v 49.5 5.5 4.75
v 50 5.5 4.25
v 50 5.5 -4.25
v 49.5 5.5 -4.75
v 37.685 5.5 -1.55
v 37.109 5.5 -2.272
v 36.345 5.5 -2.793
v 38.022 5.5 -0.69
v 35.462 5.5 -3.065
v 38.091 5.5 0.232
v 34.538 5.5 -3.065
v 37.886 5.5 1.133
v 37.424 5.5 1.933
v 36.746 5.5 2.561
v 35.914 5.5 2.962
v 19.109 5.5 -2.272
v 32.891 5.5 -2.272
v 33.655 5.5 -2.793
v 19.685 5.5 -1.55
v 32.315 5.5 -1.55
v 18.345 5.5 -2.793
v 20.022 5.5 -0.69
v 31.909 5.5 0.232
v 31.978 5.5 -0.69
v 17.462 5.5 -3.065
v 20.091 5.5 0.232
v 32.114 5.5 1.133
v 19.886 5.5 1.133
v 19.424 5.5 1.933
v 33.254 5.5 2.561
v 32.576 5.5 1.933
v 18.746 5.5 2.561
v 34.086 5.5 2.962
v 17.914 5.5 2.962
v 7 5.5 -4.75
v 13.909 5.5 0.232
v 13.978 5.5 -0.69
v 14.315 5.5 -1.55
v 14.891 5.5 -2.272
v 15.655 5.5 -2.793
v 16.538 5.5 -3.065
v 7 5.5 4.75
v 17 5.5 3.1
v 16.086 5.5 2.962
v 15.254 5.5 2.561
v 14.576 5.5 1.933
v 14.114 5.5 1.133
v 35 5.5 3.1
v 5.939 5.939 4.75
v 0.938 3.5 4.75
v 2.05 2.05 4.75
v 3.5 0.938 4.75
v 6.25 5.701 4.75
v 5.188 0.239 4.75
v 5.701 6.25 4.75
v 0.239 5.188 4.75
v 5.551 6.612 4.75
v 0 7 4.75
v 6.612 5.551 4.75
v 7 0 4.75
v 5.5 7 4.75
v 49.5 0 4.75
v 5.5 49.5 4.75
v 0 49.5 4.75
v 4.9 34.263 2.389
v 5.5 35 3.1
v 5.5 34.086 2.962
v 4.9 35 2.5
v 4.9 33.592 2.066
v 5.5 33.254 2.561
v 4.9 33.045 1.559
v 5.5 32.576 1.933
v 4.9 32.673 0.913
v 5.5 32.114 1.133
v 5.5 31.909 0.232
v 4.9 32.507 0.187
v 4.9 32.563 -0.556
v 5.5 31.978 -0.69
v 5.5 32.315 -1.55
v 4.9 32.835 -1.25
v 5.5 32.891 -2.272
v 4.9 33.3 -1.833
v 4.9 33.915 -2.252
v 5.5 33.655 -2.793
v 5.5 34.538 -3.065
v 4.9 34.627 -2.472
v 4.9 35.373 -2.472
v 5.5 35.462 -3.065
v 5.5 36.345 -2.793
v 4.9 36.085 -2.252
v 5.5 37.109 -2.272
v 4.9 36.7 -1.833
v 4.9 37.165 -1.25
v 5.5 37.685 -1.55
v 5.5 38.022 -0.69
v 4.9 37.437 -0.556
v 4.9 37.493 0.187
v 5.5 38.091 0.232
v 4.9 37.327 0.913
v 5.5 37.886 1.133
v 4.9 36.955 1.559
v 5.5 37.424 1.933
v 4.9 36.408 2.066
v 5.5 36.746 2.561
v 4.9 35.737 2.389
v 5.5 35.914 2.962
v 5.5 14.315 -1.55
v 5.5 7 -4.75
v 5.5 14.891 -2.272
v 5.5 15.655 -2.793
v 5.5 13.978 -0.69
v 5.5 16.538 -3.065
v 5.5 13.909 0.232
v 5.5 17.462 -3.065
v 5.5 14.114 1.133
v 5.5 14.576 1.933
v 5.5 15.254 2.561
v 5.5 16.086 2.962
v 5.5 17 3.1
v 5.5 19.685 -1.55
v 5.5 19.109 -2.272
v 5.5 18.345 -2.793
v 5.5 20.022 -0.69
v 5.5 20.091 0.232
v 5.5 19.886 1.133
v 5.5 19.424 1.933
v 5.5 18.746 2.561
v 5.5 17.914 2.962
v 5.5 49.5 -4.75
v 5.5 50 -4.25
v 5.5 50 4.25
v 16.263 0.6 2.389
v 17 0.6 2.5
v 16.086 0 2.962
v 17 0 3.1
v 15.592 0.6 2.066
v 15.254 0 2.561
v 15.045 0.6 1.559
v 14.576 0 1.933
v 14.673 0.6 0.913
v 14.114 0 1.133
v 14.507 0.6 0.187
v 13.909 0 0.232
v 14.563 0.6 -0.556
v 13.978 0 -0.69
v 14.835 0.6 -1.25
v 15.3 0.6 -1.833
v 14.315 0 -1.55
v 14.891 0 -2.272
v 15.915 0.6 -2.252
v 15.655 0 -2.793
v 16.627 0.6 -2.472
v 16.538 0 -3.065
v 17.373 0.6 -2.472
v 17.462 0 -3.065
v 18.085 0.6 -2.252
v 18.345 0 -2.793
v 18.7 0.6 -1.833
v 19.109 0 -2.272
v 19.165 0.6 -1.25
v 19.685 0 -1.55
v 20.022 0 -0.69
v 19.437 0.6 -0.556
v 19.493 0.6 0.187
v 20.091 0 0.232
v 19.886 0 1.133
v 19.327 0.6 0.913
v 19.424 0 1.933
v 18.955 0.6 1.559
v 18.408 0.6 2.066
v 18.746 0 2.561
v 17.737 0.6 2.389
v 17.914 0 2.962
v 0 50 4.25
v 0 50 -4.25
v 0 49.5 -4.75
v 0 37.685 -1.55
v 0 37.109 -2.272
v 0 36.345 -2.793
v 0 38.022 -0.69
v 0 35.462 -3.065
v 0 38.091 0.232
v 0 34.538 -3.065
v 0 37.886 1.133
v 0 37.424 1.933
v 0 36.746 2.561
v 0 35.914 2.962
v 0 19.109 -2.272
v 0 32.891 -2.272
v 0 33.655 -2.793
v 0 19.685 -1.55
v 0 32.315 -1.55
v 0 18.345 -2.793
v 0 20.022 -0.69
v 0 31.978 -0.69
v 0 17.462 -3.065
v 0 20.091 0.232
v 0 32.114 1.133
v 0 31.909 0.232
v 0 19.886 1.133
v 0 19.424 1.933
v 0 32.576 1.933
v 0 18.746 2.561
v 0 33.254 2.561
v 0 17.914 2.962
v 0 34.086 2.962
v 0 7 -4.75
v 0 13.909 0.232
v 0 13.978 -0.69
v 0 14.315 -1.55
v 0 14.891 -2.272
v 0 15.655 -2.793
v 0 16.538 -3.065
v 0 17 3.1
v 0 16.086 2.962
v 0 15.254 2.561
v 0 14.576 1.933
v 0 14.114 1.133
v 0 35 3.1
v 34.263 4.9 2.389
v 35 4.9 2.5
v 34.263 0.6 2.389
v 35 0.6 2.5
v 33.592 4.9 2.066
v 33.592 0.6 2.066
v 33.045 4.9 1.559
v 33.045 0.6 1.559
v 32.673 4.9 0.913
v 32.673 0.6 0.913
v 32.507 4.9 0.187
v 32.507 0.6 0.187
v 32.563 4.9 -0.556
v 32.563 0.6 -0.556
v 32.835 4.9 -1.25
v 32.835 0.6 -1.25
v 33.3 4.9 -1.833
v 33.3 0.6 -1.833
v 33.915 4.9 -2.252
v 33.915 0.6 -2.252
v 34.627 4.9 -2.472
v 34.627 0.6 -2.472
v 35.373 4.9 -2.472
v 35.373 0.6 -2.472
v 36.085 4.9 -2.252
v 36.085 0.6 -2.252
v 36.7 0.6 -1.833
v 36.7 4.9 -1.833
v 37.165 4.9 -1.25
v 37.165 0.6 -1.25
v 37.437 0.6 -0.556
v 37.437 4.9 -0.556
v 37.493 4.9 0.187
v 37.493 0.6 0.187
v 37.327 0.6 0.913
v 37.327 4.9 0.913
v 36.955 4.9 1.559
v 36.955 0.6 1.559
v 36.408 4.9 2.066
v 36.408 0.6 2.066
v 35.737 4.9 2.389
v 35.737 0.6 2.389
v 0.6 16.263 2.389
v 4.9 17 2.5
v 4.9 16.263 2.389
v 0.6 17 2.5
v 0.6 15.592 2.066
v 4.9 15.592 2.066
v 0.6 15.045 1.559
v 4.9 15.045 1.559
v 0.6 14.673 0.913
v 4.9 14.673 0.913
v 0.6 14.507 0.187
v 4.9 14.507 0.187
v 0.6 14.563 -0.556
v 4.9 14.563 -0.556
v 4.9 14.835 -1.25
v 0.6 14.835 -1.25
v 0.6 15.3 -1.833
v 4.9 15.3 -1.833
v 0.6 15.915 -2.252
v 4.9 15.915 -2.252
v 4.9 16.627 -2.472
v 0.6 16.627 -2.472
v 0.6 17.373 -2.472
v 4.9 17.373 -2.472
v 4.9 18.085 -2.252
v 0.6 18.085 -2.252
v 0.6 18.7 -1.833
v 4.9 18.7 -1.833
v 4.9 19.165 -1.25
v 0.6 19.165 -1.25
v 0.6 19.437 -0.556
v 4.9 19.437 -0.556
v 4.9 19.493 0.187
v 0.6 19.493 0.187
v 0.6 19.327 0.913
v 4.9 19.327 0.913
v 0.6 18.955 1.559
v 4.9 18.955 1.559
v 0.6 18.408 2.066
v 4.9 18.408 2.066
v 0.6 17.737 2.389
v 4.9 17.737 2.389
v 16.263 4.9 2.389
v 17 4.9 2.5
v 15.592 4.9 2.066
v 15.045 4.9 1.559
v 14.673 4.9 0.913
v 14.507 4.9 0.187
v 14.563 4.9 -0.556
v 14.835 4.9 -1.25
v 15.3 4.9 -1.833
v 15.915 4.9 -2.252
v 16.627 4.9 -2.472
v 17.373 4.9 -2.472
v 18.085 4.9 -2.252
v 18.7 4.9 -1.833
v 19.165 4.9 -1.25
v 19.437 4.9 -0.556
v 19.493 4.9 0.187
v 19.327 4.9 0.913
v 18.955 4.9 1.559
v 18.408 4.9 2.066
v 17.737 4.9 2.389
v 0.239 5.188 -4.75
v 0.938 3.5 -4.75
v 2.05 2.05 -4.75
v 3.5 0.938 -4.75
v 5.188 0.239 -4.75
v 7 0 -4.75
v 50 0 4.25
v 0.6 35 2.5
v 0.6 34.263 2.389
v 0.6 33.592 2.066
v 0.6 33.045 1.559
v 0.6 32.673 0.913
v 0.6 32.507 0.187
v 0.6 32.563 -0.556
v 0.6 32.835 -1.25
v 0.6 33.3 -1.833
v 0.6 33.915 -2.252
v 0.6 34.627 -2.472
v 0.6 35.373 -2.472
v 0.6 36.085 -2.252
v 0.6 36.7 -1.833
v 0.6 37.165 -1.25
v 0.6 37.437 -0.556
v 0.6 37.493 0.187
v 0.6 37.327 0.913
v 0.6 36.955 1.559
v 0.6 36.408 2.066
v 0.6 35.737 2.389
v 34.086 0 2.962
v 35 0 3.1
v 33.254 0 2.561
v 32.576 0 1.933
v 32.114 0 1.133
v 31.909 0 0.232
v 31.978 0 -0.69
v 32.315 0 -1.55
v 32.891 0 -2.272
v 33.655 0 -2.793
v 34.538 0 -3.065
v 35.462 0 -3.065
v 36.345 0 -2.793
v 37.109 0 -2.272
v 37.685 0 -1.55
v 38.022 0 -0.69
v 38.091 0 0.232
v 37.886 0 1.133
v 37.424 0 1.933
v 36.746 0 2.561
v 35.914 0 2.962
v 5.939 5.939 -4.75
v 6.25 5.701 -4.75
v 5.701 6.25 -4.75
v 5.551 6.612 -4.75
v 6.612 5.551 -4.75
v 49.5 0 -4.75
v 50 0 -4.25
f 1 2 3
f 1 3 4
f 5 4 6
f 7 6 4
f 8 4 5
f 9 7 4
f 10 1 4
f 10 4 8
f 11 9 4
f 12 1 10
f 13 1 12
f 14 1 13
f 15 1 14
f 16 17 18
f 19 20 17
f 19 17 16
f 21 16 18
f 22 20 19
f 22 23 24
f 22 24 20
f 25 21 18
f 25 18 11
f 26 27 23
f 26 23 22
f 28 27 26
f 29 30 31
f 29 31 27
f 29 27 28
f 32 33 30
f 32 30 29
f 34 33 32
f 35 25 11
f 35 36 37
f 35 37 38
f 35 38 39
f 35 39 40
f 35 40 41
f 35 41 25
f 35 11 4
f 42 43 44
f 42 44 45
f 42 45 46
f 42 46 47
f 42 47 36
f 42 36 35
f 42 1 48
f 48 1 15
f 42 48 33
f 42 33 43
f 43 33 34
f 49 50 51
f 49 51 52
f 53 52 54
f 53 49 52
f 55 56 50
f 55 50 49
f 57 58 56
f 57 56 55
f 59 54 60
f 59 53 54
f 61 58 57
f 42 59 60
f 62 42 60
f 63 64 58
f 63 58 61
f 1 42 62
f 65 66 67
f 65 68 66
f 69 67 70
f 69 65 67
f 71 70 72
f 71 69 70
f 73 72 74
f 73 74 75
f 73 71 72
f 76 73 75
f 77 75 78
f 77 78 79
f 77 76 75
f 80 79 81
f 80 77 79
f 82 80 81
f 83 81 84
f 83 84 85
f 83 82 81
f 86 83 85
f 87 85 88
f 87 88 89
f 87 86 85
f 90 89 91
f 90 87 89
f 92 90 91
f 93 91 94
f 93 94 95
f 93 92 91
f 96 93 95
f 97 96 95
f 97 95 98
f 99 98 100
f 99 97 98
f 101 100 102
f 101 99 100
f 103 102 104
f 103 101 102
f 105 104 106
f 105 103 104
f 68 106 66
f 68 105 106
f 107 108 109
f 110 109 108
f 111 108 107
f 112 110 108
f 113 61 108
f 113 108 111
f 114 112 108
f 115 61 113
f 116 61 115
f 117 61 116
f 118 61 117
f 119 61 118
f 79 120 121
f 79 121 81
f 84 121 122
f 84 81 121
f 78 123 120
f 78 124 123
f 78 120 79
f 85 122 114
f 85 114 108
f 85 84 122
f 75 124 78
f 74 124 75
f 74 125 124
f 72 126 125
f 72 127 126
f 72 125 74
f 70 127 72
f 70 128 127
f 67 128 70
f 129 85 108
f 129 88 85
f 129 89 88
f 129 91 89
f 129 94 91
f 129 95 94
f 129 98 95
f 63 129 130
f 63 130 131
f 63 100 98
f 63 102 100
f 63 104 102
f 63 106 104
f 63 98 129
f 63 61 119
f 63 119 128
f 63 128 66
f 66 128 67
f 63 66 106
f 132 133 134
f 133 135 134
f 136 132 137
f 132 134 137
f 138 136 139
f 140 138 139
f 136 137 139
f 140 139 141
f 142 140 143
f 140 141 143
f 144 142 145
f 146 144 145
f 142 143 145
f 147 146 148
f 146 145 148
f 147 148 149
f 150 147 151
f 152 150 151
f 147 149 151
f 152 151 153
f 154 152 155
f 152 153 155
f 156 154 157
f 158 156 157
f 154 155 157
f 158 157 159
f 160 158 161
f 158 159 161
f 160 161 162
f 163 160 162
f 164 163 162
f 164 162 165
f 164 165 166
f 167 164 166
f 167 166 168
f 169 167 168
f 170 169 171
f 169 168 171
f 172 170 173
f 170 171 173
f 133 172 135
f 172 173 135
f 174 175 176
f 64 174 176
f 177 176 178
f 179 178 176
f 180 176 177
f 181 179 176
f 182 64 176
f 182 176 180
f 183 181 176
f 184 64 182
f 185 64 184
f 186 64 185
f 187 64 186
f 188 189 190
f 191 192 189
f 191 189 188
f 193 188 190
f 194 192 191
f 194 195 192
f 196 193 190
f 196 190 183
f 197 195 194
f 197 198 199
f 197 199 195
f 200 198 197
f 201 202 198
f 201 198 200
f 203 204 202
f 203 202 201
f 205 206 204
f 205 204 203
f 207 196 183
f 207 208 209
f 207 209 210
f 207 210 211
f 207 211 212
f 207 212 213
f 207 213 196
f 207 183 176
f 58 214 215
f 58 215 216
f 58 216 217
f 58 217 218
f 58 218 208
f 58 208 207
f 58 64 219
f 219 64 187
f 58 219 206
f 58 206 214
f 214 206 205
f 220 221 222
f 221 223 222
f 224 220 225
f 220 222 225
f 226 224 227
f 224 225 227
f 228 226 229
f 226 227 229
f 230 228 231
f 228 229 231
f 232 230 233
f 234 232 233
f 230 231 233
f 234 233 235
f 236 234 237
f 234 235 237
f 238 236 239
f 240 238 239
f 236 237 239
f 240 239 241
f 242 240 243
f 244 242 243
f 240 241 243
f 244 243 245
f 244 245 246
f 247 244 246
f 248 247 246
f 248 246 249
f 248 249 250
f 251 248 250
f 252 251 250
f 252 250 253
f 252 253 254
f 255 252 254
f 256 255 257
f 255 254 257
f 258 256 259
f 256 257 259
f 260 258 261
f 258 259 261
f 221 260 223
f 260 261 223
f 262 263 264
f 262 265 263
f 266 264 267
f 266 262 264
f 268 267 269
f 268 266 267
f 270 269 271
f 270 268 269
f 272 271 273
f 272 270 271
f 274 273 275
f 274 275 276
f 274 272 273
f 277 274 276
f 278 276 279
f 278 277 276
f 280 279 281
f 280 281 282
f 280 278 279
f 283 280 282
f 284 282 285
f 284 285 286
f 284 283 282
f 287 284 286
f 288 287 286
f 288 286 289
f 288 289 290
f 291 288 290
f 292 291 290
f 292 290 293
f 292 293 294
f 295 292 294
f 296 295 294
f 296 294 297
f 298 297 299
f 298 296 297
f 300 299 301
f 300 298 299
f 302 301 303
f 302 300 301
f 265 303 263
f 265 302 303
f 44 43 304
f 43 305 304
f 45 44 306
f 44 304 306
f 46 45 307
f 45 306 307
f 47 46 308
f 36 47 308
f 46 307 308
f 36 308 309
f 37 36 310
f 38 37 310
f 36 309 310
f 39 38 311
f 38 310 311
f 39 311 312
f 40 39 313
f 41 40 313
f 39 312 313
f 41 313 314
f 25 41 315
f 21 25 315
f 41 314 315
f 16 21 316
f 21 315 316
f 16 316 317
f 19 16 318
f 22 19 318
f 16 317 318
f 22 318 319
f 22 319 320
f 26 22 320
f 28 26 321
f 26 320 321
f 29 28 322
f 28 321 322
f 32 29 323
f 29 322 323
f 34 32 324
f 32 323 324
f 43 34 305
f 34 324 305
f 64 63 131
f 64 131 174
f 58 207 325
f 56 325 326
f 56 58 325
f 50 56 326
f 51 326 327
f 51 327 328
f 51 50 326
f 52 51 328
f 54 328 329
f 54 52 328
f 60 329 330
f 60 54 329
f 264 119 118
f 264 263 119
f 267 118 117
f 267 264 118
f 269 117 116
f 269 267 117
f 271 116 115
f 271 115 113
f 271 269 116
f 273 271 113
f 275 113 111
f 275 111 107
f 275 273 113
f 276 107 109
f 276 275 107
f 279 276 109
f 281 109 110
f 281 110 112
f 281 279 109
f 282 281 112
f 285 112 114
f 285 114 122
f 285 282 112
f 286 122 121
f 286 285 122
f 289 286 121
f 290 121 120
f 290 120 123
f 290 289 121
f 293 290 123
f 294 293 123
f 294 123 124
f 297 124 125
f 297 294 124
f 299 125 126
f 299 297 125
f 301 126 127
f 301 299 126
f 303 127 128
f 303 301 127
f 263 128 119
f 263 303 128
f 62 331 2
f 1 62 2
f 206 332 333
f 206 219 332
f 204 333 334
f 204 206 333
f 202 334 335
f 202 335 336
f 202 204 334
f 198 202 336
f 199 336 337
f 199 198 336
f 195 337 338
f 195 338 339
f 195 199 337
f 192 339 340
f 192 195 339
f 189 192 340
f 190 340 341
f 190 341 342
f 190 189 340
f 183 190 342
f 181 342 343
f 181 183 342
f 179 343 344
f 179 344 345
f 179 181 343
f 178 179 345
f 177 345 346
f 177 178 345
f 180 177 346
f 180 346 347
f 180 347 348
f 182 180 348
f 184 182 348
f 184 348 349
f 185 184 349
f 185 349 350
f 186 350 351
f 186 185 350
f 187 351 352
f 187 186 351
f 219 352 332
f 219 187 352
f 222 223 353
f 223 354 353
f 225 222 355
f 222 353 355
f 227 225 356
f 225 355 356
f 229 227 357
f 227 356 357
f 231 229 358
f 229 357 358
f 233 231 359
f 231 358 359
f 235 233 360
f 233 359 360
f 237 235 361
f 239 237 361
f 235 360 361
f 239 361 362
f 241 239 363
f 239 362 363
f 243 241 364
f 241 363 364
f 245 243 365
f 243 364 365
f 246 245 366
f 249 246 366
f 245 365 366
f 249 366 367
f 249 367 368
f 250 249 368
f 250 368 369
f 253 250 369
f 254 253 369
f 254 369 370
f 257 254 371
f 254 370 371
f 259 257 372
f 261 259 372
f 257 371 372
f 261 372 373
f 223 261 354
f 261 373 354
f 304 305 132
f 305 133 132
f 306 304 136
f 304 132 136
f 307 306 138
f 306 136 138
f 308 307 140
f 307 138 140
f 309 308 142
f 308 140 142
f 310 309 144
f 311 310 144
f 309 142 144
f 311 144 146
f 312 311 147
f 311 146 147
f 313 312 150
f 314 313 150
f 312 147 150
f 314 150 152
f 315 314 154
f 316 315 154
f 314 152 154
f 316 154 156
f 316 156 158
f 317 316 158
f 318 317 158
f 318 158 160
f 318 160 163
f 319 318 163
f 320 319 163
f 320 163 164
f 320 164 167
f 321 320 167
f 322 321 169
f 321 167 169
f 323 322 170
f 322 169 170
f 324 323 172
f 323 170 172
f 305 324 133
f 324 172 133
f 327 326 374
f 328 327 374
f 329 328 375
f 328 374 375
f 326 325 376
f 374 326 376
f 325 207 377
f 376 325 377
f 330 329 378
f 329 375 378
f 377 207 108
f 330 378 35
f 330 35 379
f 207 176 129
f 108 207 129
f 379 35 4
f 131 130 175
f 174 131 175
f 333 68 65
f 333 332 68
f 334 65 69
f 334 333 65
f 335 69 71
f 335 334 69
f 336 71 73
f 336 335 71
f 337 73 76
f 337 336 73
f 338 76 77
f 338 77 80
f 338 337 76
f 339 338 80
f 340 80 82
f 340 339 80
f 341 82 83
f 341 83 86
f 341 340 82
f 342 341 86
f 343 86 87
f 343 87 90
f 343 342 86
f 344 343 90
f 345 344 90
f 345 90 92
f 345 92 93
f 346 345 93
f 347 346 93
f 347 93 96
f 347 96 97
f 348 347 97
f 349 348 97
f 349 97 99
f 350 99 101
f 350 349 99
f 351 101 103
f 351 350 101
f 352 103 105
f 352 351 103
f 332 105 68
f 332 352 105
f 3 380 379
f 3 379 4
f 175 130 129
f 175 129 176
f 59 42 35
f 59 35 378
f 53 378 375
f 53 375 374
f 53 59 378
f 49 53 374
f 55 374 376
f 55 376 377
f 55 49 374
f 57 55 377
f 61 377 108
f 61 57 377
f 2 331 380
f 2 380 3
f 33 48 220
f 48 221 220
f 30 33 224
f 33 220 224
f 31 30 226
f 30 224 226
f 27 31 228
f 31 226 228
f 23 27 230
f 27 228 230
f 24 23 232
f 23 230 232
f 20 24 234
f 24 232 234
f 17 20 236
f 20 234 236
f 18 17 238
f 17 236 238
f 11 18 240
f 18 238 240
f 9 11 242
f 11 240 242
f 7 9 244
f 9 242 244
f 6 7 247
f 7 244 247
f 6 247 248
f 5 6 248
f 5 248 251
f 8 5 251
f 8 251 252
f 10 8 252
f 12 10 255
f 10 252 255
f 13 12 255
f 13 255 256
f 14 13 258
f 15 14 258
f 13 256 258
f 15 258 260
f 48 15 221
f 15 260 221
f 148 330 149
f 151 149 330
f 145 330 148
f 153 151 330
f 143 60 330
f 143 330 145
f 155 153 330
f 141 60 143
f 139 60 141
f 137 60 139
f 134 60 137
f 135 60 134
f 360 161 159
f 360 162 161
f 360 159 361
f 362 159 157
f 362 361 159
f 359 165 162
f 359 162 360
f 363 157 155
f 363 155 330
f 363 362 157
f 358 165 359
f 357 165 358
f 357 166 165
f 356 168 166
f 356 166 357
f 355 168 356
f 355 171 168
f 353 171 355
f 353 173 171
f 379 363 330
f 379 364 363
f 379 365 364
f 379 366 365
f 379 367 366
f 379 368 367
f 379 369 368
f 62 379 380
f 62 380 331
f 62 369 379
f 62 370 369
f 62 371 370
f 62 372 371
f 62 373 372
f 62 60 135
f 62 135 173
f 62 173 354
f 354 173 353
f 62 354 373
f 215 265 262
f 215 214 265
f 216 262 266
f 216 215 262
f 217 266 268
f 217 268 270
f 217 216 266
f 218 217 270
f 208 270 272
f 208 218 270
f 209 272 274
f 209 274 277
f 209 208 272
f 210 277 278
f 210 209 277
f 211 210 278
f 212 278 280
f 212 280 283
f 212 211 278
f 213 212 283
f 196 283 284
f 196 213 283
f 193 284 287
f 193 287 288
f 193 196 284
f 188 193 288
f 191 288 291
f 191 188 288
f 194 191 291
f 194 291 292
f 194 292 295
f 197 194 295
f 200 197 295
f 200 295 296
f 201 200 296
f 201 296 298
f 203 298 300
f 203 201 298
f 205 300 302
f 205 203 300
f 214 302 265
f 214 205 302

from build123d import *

# Parameters (mm, degrees)
EXTRUDE_1_DEPTH            = 4.75
HOLE_WIZARD_M61_AT_2_COUNT = 2
HOLE_WIZARD_M61_AT_2_PITCH = 18
CHAMFER_1_SIZE             = 0.5


with BuildPart() as part:
    # Эскиз1 → Бобышка-Вытянуть1 (new body, symmetric)
    with BuildSketch(Plane.XY):
        with BuildLine():
            Line((0, 50), (0, 7))
            ThreePointArc((0, 7), (2.050252532, 2.050252532), (7, 0))
            Line((7, 0), (50, 0))
            Line((50, 0), (50, 5.5))
            Line((50, 5.5), (7, 5.5))
            ThreePointArc((7, 5.5), (5.939339828, 5.939339828), (5.5, 7))
            Line((5.5, 7), (5.5, 50))
            Line((5.5, 50), (0, 50))
        make_face()
    extrude(amount=EXTRUDE_1_DEPTH, both=True)

    # Эскиз5 → Отверстие обработанное метчиком M61 (revolve, cut)
    with BuildSketch(Plane.ZX.offset(35)):
        Polygon((0, 0), (0, 5.5), (3.1, 5.5), (2.5, 4.9), (2.5, 0.6), (3.1, 0), align=None)
    hole_wizard_m61 = revolve(axis=Axis((-6.35, 35, 0), (1, 0, 0)), mode=Mode.SUBTRACT)

    # Отверстие обработанное метчиком M61 at 2: Отверстие обработанное метчиком M61 ×2
    with Locations(*[(0, -i * HOLE_WIZARD_M61_AT_2_PITCH, 0) for i in range(1, HOLE_WIZARD_M61_AT_2_COUNT)]):
        add(hole_wizard_m61, mode=Mode.SUBTRACT)

    # Зеркальное отражение1: Отверстие обработанное метчиком M61 across plane
    add(hole_wizard_m61.mirror(Plane(origin=(0, 0, 0), x_dir=(0, 0, 1), z_dir=(-0.707106781, 0.707106781, 0))), mode=Mode.SUBTRACT)

    # Зеркальное отражение1 copy 1 sketch → Зеркальное отражение1 copy 1 (revolve, cut)
    with BuildSketch(Plane(origin=(17, 0, 0), x_dir=(0, 0, 1), z_dir=(1, 0, 0))):
        Polygon((0, 0), (0, -5.5), (3.1, -5.5), (2.5, -4.9), (2.5, -0.6), (3.1, 0), align=None)
    revolve(axis=Axis((17, -6.35, 0), (0, -1, 0)), mode=Mode.SUBTRACT)

    # Фаска1
    chamfer_1_edges = [part.edges().sort_by_distance(p)[0] for p in [
        (2.75, 50, -4.75),
        (50, 2.75, 4.75),
        (2.75, 50, 4.75),
        (50, 2.75, -4.75),
    ]]
    chamfer(chamfer_1_edges, length=CHAMFER_1_SIZE)


solid = part.part
